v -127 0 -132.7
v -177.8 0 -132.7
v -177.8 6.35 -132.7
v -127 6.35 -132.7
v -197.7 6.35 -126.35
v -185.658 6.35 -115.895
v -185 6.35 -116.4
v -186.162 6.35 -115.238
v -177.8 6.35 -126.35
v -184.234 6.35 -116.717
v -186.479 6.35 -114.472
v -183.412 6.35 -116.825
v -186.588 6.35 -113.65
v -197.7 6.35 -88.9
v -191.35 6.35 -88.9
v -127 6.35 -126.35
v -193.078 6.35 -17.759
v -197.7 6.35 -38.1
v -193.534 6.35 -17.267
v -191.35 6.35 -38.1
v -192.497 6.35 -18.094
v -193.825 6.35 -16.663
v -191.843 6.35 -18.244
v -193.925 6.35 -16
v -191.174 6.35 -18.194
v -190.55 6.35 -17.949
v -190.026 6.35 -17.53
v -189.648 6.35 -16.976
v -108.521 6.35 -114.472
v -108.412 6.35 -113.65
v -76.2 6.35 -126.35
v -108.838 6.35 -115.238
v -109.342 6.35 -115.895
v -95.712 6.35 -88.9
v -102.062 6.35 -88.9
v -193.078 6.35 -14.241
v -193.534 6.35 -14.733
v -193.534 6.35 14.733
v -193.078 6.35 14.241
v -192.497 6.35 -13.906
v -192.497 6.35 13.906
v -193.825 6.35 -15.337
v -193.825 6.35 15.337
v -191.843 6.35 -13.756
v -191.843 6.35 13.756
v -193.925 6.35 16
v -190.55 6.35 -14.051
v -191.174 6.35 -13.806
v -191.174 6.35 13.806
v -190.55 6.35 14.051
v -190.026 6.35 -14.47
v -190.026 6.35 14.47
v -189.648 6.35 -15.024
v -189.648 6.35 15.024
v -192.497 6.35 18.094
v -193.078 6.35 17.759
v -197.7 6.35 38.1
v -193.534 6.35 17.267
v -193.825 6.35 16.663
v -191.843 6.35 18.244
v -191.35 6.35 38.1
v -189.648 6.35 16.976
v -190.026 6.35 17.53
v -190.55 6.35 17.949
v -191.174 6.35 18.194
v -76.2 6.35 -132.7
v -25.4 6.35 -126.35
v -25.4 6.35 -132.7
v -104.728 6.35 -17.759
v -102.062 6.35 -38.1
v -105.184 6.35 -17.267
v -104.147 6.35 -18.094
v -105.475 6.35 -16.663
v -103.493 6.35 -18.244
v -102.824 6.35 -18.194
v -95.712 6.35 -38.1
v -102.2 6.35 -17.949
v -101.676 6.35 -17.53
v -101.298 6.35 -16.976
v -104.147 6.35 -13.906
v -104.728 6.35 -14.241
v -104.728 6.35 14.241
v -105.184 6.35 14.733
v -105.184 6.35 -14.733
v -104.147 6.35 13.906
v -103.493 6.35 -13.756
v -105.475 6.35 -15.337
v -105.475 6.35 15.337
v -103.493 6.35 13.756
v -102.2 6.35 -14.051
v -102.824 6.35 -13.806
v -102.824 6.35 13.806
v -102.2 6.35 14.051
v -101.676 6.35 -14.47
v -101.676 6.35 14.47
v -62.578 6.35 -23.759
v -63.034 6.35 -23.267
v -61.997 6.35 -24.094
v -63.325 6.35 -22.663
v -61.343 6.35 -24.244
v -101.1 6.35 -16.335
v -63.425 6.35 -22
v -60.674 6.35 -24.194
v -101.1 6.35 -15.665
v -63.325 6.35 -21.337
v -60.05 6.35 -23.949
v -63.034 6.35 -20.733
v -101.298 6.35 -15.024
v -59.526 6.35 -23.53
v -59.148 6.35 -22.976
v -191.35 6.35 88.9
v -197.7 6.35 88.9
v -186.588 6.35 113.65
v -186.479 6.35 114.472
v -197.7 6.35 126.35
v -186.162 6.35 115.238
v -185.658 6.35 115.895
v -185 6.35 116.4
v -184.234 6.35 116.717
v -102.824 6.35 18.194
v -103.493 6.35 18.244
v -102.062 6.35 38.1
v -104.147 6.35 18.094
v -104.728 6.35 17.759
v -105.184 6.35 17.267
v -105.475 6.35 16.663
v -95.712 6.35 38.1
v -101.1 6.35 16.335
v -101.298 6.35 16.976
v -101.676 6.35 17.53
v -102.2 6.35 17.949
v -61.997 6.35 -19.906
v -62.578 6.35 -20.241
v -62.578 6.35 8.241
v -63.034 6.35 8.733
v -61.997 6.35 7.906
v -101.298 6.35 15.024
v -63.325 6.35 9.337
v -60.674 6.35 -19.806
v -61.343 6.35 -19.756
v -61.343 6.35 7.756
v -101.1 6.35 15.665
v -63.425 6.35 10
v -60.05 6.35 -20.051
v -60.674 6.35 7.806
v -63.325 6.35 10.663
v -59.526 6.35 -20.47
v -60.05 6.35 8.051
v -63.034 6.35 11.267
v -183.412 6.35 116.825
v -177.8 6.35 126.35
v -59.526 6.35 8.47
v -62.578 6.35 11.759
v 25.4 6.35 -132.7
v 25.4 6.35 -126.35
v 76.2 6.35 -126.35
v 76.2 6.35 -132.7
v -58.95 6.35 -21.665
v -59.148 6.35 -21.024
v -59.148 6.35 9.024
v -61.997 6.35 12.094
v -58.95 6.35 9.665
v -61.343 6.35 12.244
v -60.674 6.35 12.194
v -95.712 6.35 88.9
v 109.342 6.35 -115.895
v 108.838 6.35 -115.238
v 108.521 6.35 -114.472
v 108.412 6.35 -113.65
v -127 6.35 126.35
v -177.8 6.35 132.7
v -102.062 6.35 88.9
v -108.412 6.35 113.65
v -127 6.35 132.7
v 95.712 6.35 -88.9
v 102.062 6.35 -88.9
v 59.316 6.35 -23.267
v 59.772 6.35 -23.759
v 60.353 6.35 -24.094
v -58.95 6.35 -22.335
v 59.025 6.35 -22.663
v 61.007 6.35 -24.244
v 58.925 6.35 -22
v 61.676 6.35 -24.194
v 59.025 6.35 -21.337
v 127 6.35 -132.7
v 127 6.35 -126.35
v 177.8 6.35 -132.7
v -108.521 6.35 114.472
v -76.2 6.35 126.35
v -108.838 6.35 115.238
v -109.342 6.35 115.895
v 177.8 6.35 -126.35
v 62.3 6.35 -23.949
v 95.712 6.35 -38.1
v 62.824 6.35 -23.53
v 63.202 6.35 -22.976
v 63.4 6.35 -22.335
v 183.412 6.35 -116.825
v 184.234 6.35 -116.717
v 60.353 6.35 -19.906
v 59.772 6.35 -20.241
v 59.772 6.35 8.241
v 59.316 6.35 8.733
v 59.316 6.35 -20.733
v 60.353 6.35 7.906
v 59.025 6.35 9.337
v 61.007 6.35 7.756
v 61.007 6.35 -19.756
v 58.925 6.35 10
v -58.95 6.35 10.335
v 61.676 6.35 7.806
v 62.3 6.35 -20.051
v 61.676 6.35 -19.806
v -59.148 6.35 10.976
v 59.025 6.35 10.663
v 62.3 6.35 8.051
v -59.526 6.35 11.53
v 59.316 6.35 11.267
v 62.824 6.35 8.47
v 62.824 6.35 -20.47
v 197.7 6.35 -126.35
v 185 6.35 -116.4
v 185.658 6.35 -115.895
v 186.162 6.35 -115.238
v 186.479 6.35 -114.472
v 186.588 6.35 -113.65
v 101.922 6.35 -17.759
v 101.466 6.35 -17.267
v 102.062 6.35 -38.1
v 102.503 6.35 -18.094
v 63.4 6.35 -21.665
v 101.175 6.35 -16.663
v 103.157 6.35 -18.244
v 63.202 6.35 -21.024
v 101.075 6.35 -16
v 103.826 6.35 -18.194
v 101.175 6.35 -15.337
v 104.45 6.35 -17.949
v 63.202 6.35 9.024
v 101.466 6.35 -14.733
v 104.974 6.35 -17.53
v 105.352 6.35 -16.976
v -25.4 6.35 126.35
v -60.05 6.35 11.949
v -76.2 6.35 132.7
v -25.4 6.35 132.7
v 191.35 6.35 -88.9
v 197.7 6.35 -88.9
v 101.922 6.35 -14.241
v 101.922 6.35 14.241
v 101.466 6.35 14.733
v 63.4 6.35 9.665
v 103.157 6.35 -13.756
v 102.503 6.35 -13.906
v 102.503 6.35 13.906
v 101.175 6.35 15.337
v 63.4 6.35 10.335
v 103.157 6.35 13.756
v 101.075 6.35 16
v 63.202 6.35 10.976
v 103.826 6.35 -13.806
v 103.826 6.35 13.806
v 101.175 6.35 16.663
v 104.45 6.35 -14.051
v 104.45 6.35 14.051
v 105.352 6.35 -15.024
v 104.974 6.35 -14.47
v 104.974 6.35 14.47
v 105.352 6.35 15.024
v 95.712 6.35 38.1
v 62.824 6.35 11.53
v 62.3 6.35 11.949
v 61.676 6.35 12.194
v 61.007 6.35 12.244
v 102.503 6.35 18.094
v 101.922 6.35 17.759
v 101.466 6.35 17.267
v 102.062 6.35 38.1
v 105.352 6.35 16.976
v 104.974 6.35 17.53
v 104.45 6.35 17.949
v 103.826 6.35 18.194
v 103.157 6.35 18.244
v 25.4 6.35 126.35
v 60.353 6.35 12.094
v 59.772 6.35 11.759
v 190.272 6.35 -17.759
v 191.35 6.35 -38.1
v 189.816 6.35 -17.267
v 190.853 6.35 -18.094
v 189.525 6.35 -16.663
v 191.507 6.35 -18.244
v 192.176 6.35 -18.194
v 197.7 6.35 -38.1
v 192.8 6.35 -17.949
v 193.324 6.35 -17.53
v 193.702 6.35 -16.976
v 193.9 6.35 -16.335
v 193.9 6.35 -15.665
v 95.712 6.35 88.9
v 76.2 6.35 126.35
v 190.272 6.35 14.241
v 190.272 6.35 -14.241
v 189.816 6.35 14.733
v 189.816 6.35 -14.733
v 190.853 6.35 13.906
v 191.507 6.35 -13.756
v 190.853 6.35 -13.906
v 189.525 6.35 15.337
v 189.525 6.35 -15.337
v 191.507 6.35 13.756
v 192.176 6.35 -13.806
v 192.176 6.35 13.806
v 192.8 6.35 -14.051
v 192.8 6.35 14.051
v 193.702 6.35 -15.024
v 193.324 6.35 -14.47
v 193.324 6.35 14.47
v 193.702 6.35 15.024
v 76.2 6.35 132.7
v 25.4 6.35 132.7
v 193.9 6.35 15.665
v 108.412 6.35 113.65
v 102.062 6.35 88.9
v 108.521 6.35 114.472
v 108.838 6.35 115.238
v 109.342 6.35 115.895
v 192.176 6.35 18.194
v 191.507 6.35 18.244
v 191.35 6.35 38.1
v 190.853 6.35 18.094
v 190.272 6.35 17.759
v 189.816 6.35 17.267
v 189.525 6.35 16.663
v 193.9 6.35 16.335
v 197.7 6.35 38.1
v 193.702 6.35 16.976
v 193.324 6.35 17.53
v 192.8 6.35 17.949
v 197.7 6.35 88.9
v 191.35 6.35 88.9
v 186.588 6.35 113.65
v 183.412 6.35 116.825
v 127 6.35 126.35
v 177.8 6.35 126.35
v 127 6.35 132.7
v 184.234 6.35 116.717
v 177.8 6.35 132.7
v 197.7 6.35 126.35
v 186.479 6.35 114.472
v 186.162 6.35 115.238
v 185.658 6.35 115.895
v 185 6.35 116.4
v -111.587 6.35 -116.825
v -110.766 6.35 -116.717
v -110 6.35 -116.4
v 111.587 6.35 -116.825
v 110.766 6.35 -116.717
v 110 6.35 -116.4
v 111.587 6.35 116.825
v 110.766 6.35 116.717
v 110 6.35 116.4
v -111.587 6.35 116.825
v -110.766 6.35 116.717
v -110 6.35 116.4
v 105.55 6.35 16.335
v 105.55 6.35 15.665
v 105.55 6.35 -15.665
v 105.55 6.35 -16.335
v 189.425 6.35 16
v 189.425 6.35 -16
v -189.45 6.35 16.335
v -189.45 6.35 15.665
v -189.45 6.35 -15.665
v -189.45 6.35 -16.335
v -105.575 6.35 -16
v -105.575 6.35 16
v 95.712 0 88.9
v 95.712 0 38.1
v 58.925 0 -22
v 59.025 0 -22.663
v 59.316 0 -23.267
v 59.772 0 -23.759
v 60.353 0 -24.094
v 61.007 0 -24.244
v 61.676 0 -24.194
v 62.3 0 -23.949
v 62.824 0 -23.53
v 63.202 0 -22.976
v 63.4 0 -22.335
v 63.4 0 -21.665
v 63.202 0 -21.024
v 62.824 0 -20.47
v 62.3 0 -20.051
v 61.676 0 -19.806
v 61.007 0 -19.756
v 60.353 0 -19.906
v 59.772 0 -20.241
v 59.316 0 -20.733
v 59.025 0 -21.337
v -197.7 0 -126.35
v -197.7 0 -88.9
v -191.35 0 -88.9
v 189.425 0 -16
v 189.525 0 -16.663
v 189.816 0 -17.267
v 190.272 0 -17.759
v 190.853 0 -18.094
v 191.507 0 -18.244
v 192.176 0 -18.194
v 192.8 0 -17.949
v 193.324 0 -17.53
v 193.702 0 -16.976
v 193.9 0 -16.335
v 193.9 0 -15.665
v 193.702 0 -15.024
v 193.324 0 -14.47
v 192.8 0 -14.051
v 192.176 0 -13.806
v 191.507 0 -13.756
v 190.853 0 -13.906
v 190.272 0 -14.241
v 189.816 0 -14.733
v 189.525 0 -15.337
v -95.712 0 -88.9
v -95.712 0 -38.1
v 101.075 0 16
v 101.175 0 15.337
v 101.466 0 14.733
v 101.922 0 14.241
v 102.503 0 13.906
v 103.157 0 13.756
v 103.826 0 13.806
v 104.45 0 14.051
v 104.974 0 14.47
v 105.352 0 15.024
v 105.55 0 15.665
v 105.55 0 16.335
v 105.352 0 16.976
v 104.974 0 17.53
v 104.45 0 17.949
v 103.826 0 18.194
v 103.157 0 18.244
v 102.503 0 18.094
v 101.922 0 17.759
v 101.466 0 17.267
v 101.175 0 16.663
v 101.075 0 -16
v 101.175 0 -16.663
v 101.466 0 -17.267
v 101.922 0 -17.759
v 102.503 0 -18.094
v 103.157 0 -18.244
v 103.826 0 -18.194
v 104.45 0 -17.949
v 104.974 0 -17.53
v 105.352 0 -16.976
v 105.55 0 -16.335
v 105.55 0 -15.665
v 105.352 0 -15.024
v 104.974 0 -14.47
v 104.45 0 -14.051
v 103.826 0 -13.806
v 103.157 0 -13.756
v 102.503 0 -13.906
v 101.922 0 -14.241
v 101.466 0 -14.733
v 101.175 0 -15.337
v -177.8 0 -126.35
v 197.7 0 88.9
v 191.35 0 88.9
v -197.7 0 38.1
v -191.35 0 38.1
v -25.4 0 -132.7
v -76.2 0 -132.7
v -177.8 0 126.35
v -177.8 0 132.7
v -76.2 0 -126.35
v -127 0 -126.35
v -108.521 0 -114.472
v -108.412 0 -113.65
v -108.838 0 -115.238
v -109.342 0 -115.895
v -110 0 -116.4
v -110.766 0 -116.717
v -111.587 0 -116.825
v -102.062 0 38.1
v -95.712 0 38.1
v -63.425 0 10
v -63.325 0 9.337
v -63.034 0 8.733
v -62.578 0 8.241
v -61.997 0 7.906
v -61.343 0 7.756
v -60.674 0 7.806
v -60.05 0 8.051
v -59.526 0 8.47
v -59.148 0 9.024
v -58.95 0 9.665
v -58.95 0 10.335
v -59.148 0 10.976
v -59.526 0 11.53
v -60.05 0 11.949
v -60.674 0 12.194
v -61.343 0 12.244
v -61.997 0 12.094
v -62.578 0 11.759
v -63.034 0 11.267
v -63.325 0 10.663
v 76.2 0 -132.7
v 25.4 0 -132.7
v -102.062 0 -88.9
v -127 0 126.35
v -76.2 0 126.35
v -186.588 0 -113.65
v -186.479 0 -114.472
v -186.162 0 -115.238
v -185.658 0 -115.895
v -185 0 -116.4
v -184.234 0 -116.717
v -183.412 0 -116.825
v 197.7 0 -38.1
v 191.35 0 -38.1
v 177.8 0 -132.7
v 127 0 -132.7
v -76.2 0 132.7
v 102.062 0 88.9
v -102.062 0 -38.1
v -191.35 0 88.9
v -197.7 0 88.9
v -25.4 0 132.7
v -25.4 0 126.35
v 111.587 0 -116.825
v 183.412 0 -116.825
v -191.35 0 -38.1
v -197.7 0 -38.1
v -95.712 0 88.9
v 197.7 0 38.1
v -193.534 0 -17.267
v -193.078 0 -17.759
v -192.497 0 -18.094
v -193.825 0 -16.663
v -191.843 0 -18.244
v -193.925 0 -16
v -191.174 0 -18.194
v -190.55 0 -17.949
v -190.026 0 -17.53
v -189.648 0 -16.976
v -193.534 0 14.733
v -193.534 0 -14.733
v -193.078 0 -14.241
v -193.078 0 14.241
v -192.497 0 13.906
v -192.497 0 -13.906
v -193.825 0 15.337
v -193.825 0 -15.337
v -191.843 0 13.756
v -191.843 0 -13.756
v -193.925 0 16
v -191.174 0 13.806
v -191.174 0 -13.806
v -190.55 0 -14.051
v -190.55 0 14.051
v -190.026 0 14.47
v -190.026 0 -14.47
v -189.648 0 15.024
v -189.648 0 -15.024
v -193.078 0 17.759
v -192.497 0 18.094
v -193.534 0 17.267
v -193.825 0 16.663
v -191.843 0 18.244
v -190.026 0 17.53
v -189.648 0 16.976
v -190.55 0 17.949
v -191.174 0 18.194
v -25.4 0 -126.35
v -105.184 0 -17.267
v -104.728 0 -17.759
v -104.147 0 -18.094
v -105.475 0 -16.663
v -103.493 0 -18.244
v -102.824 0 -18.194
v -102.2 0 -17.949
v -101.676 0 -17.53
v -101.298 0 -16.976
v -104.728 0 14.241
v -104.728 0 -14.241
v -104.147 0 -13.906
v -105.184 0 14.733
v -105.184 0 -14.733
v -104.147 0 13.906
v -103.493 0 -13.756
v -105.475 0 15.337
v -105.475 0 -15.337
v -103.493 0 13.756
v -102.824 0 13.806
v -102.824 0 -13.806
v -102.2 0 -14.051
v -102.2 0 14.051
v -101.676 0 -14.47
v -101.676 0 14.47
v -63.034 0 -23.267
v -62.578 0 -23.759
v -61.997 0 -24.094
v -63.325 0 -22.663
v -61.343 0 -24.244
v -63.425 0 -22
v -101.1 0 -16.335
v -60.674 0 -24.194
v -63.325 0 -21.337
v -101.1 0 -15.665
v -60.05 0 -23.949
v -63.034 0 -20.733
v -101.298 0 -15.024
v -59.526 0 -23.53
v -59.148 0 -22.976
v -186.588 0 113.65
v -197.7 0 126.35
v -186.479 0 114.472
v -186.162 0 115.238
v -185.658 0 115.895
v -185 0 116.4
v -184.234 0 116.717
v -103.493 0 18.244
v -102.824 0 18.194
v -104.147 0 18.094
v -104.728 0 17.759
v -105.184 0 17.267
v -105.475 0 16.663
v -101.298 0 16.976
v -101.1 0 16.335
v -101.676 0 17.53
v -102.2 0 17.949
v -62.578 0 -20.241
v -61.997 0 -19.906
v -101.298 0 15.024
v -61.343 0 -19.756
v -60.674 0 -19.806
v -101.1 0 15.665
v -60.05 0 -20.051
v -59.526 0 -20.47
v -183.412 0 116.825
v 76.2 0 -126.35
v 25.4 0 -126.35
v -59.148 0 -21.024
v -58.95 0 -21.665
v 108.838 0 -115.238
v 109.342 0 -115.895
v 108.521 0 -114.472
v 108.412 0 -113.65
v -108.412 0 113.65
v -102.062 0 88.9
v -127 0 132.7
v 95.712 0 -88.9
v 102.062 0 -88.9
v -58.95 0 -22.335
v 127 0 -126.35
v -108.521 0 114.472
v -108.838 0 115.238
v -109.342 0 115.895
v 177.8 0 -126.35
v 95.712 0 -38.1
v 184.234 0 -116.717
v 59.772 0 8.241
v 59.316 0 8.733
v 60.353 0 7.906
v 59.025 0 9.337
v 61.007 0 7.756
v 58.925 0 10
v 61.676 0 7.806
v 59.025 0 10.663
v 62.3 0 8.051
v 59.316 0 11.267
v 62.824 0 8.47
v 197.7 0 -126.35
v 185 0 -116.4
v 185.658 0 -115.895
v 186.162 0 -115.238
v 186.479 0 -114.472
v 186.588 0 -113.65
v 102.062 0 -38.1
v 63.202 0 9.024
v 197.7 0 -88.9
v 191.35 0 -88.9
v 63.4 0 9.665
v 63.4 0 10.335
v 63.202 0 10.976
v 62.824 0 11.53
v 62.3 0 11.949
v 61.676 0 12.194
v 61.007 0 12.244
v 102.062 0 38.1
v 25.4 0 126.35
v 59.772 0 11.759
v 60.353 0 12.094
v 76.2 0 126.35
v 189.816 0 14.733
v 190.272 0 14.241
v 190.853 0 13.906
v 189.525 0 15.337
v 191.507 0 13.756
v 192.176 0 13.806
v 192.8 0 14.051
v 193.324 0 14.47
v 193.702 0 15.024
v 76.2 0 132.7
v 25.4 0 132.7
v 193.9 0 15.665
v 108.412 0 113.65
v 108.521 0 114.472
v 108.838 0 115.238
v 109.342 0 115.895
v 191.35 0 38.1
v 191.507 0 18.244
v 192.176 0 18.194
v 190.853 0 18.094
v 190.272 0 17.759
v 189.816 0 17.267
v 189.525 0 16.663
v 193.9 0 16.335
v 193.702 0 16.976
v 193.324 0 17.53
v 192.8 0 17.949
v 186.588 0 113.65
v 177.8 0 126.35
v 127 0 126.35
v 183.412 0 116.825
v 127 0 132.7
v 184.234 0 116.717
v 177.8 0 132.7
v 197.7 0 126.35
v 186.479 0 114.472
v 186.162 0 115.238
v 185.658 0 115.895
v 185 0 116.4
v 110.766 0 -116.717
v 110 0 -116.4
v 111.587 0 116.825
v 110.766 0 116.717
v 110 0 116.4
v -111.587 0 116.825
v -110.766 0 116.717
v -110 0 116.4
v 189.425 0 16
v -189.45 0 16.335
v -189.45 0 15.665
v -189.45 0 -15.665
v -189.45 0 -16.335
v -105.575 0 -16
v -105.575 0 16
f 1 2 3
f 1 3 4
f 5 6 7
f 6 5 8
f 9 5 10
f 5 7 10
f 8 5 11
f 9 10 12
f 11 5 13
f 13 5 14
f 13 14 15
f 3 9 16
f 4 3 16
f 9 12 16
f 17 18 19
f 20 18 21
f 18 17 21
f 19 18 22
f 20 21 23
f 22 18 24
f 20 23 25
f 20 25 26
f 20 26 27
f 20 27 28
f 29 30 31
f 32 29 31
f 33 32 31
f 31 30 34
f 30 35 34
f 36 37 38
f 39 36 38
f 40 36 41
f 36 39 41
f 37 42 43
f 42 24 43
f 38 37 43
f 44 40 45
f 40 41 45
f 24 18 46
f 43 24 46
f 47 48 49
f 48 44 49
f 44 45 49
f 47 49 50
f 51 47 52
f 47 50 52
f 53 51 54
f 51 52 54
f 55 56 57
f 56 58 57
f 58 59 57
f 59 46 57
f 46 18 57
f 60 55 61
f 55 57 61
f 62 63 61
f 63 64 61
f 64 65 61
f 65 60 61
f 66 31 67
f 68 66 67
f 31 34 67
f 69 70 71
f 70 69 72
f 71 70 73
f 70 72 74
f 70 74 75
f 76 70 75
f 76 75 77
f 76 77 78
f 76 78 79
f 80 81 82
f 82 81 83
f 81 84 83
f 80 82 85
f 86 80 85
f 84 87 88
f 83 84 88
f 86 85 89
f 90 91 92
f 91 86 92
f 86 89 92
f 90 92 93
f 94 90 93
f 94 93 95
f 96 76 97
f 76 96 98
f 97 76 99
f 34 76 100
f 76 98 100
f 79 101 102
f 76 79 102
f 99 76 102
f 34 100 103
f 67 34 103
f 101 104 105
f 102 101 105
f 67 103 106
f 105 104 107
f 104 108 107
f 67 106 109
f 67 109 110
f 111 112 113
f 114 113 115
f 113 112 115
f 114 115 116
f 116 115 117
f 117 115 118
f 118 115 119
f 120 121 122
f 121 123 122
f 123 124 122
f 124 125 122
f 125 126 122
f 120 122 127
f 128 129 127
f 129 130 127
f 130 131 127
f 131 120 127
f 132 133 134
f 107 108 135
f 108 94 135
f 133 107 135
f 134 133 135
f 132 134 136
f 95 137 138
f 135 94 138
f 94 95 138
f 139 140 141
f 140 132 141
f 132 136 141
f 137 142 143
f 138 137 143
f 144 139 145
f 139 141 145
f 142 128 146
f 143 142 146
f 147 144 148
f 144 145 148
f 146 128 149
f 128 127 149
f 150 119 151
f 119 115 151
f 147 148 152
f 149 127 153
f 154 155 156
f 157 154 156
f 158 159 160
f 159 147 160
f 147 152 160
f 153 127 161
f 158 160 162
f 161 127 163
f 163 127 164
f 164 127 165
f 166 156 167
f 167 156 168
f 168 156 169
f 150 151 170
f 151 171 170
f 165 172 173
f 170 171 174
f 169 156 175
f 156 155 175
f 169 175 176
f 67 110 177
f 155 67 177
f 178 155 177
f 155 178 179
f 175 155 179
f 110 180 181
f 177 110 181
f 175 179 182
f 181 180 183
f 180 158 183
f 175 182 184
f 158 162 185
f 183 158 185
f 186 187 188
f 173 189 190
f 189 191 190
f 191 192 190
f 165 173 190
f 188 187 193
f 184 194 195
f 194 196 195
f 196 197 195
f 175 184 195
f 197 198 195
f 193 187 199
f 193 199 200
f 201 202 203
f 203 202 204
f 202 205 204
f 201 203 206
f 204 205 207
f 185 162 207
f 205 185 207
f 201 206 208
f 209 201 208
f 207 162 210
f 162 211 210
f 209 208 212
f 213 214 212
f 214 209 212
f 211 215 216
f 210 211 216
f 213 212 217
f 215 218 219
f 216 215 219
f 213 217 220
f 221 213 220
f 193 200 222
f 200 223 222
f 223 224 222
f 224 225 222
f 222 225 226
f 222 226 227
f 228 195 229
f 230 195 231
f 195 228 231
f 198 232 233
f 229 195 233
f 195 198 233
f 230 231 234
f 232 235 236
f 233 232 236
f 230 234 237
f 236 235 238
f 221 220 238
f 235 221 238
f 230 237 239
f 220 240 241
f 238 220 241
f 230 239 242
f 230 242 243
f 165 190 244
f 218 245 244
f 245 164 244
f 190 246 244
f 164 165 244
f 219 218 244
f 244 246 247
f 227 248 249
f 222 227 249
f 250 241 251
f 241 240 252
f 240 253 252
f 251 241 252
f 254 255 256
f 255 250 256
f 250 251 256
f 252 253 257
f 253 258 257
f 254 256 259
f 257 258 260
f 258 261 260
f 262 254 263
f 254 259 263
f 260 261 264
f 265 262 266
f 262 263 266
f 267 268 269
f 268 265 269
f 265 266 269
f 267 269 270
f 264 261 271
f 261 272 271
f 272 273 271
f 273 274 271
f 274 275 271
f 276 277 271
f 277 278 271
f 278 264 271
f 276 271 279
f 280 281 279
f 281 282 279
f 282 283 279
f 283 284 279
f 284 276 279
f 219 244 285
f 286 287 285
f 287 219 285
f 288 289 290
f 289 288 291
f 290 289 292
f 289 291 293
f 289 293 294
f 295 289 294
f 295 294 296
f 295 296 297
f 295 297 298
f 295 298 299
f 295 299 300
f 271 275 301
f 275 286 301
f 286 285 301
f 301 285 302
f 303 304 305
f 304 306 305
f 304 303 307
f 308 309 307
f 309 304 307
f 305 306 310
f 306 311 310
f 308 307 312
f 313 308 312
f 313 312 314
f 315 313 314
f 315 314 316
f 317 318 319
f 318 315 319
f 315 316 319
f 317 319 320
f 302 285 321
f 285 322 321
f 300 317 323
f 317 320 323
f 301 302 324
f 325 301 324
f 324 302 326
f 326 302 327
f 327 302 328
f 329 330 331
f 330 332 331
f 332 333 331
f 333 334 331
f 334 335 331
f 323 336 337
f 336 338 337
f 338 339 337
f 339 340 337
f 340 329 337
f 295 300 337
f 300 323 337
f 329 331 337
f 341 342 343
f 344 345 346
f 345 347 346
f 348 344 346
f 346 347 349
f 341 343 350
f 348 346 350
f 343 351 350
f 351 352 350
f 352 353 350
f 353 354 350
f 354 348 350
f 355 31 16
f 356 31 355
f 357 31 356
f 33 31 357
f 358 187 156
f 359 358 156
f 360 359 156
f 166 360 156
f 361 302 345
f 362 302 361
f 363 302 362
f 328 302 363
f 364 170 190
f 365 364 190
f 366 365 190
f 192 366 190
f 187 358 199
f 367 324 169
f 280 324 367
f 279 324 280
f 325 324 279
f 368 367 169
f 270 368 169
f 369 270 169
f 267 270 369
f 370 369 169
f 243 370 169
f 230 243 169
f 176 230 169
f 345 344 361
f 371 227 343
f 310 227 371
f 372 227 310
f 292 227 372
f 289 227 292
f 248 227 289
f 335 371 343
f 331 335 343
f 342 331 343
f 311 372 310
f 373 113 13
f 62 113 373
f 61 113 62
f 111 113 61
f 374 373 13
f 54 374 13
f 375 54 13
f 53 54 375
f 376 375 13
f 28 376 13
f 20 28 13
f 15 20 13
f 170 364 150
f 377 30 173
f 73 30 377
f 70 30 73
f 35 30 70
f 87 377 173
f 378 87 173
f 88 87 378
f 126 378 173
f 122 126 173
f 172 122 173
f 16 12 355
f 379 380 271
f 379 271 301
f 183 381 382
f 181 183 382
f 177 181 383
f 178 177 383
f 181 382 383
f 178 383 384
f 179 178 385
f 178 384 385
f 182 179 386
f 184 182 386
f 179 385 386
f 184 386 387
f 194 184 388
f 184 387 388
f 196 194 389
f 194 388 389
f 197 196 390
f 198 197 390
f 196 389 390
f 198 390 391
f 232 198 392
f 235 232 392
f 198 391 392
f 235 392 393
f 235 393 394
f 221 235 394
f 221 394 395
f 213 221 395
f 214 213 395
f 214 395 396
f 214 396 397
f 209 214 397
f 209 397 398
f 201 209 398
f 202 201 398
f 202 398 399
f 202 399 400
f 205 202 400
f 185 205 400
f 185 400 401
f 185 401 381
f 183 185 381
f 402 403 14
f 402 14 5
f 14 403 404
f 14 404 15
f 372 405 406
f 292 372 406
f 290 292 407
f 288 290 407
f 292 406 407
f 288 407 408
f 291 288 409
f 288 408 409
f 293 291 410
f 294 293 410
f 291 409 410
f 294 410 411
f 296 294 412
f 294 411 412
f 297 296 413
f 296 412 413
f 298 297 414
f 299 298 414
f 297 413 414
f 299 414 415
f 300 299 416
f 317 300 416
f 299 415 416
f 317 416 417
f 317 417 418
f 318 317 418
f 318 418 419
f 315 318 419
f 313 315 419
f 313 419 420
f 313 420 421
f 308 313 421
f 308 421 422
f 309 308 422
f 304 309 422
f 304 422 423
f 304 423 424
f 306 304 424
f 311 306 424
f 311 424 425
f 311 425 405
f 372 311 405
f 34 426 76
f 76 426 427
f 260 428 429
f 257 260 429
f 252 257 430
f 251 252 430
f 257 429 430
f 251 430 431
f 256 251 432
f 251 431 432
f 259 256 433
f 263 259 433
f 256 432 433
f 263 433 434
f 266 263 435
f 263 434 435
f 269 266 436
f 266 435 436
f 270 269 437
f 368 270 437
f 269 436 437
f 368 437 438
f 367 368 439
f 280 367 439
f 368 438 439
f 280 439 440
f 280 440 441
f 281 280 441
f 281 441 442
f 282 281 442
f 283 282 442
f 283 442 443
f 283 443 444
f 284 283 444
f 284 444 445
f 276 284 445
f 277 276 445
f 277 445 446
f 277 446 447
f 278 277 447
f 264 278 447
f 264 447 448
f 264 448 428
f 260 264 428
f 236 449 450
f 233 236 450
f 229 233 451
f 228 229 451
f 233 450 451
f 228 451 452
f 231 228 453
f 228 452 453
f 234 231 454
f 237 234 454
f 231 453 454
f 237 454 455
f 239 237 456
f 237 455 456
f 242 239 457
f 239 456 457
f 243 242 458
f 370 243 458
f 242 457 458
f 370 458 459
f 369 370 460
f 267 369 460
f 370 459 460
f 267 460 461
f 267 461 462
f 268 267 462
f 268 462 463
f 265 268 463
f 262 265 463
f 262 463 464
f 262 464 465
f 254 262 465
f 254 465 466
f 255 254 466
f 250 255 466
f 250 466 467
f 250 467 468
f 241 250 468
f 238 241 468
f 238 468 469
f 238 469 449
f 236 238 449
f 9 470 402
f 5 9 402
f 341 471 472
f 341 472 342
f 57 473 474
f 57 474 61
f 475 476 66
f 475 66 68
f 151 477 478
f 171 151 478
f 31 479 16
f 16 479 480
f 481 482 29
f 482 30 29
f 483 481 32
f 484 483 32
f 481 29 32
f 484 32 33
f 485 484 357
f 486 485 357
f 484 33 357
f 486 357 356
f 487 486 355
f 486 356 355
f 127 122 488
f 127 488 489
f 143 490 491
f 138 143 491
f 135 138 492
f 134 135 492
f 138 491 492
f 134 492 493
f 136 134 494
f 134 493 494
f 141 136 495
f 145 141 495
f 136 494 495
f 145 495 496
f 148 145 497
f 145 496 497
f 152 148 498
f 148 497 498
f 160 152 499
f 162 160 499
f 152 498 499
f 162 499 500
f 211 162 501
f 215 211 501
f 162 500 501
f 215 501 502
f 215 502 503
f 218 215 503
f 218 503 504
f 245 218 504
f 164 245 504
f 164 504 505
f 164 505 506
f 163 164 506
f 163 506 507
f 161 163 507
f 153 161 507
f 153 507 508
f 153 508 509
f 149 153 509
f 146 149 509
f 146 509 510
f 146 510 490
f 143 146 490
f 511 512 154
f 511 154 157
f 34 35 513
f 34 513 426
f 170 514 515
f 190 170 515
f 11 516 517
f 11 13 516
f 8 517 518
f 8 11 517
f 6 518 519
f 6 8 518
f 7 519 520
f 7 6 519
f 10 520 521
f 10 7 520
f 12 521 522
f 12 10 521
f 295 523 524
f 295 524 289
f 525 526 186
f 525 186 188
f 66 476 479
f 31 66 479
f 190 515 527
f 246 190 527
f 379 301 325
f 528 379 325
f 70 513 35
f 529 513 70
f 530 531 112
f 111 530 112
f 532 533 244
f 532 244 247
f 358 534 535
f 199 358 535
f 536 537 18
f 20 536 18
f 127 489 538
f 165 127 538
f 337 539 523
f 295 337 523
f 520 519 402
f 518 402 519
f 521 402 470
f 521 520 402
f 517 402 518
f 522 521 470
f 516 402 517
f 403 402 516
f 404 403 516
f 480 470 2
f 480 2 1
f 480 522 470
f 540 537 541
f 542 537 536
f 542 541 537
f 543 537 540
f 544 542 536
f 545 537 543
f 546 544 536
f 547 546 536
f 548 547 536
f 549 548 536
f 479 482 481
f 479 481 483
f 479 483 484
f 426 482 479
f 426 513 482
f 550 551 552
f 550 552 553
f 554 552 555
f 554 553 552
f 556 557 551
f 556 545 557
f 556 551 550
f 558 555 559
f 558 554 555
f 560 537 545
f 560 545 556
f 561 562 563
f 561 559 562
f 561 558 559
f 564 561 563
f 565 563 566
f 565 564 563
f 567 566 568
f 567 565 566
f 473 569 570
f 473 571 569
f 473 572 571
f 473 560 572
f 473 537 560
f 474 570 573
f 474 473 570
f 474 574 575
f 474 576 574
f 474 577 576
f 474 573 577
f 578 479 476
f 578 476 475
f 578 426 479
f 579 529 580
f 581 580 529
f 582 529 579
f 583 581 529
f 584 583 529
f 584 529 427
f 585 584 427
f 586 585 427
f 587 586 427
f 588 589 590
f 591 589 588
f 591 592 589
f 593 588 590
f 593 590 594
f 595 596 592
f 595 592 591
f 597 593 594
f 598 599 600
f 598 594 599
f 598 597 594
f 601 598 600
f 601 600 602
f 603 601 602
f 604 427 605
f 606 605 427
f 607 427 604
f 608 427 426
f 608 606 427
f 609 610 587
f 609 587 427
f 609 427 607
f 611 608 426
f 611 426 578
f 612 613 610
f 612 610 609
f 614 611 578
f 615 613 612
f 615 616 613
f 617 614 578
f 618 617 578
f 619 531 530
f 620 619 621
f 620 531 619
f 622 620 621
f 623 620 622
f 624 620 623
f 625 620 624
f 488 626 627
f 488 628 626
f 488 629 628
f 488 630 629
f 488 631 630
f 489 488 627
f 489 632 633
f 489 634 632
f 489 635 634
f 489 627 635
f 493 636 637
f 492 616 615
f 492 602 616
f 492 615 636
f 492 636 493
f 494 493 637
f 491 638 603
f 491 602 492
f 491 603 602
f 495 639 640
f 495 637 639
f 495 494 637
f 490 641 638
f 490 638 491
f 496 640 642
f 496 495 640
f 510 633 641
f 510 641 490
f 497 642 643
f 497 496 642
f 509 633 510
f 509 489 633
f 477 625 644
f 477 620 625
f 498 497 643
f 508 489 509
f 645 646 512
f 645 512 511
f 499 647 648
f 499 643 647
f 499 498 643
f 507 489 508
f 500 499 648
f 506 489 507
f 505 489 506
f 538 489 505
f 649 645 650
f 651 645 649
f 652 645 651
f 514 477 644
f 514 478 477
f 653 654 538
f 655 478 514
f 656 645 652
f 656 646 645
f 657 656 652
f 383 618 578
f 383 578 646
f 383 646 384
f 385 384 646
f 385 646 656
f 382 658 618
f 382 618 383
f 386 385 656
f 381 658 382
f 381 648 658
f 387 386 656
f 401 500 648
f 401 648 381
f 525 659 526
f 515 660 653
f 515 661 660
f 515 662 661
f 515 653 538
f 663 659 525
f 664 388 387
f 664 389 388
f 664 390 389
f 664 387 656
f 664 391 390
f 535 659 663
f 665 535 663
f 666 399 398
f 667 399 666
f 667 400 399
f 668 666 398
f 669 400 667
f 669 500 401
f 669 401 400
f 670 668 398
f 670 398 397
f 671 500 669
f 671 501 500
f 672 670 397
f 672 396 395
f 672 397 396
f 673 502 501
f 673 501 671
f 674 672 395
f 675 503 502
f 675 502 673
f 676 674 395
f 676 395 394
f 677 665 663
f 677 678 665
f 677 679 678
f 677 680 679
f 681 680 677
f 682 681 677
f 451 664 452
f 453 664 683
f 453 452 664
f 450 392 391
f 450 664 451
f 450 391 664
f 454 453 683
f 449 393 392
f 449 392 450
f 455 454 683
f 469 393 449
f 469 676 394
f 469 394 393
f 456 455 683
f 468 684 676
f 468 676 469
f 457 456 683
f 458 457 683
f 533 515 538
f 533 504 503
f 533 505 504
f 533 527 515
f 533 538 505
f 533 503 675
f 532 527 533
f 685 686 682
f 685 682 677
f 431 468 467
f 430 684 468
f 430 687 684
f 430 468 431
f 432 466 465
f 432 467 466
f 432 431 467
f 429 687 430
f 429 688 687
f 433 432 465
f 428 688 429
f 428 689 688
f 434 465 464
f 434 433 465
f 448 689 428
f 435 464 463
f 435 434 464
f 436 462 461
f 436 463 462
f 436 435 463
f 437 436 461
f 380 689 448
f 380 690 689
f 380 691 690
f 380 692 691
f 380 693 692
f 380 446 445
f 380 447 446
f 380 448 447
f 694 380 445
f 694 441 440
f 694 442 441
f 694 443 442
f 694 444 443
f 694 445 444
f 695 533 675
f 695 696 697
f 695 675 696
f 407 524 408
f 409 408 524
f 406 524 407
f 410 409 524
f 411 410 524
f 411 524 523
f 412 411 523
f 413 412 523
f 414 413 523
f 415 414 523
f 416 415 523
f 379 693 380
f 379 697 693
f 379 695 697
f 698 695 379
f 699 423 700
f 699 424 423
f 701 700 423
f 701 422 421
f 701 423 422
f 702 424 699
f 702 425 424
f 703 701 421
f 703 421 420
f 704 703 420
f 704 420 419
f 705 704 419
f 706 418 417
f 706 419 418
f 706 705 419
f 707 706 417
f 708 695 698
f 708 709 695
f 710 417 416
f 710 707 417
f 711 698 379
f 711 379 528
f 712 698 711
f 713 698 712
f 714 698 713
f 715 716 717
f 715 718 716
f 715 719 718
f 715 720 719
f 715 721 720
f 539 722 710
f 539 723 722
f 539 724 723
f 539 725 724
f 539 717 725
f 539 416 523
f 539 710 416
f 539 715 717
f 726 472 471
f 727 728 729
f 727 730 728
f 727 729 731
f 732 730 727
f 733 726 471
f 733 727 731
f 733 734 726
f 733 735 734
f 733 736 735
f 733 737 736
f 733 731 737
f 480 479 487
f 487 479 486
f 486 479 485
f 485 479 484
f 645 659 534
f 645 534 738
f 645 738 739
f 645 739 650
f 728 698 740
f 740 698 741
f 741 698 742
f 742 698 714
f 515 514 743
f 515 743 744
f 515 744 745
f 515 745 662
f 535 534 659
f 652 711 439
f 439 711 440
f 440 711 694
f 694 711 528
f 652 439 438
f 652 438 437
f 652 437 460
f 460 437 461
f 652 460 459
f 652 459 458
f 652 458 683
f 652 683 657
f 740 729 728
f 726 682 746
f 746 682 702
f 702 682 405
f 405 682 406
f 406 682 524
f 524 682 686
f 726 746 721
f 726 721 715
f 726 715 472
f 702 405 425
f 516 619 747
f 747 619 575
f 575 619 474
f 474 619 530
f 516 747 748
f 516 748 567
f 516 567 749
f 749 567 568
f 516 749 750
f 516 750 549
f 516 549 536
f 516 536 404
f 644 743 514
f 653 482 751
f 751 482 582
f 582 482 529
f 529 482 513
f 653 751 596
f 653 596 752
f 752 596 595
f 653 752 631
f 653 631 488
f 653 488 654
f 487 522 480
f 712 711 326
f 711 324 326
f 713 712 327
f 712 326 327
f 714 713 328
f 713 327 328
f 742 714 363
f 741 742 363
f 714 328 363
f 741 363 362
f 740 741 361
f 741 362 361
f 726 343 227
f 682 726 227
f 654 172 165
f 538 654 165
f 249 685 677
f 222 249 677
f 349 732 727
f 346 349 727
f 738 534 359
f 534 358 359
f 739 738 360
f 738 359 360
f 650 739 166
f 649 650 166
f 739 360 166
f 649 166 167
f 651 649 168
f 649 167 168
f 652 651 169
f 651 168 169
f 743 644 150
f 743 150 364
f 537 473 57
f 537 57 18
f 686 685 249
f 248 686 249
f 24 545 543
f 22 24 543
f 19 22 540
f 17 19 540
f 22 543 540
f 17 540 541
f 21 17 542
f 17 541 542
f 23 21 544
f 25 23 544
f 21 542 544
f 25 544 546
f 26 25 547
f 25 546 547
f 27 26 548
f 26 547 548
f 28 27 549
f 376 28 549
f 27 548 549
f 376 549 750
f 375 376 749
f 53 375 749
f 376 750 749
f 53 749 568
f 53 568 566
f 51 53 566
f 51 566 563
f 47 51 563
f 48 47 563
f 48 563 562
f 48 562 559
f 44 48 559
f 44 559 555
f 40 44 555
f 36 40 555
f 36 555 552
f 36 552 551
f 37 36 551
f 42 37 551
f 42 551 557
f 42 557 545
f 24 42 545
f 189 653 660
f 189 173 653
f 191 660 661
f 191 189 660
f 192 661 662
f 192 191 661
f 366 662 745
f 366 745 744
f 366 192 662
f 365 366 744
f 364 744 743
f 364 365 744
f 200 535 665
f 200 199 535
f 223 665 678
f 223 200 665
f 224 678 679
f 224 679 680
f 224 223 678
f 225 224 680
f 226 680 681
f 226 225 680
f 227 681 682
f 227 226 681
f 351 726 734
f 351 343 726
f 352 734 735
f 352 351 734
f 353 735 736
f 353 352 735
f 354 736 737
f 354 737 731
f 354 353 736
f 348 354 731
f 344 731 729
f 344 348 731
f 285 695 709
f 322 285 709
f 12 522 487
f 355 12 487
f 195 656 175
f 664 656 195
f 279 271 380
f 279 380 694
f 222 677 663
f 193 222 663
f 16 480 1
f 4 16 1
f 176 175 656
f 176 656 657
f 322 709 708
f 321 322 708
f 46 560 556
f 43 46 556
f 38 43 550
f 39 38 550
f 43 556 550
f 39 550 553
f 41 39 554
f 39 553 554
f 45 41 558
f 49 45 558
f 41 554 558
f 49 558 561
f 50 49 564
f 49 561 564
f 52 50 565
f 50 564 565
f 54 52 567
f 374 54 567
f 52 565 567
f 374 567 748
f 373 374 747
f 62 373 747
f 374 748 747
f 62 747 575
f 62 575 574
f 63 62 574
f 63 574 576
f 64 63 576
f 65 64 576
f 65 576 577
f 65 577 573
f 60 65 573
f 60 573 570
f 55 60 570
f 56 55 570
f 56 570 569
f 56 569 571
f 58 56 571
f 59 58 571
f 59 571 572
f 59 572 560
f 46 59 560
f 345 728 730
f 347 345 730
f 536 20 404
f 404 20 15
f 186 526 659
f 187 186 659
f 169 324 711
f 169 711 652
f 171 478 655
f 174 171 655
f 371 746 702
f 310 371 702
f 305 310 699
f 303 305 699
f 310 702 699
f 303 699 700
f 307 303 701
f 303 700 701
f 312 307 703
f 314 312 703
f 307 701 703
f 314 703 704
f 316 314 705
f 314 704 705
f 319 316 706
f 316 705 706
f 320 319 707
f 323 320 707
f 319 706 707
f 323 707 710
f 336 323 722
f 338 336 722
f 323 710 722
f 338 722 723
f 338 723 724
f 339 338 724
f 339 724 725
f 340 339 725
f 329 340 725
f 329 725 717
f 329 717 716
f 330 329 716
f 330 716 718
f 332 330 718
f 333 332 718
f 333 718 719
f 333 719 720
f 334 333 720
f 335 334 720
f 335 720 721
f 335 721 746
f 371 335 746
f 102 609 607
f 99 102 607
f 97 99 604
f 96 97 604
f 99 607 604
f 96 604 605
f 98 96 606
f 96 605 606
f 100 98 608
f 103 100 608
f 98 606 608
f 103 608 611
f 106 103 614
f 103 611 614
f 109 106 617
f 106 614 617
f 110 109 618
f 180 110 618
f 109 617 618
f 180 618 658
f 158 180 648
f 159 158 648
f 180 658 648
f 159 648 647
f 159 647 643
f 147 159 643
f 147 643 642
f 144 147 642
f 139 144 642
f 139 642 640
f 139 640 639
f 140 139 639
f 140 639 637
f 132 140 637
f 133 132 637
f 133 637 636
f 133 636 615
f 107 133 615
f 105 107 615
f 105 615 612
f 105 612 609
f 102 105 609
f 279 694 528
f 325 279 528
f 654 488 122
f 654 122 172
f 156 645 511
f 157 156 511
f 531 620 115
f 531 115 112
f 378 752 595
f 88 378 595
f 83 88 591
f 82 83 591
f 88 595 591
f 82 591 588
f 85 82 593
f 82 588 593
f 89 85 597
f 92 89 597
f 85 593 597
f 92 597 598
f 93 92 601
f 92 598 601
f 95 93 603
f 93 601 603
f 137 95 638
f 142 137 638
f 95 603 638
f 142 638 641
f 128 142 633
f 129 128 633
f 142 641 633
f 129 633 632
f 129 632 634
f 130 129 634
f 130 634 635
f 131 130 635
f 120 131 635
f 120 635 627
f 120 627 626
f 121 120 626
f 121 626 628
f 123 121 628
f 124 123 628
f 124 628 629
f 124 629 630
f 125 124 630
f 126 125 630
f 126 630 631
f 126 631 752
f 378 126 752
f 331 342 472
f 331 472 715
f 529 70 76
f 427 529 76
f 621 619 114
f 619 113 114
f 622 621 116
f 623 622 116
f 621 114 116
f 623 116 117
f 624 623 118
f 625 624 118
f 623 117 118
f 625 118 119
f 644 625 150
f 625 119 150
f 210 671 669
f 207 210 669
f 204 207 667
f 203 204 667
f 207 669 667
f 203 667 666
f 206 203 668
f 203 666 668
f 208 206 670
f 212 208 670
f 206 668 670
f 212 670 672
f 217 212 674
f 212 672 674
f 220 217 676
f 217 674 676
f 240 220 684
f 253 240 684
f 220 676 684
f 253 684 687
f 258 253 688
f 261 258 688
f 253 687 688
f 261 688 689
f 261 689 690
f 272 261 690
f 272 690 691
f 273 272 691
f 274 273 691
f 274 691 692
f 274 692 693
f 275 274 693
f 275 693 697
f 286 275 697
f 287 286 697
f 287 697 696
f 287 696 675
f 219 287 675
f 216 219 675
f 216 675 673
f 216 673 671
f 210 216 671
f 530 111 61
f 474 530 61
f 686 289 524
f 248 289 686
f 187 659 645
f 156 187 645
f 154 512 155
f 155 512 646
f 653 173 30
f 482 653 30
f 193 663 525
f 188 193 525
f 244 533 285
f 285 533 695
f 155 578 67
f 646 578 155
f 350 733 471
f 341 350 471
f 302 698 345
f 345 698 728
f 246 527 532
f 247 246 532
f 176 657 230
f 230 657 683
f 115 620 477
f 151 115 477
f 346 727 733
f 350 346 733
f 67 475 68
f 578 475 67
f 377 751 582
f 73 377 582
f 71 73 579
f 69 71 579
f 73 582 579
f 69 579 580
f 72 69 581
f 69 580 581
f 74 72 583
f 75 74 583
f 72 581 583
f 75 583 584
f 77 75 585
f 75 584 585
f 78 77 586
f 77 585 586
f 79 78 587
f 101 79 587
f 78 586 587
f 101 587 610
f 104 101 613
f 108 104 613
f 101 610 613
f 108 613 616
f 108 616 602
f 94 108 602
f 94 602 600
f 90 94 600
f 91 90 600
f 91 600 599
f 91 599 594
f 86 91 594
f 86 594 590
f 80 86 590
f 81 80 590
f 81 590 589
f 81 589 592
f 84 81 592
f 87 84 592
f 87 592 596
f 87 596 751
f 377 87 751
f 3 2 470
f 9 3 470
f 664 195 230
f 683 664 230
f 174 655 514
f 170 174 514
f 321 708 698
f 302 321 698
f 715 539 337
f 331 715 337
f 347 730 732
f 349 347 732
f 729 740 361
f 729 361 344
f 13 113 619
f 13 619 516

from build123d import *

# Parameters (mm, degrees)
SKETCH5_W             = 395.4
SKETCH5_H             = 265.4
BOSS_EXTRUDE3_DEPTH   = 6.35
SKETCH6_W             = 78.175
SKETCH6_H             = 243.175
SKETCH6_W_2           = 75
SKETCH6_H_2           = 240
CUT_EXTRUDE1_DEPTH    = 6.35
F_4_0MM_DOWEL_HOLE1_D = 4.5
SKETCH10_W            = 6.35
SKETCH10_H            = 50.8
SKETCH10_W_2          = 50.8
SKETCH10_H_2          = 6.35
CUT_EXTRUDE2_DEPTH    = 6.35
SKETCH11_W            = 50.8
SKETCH11_H            = 6.35
CUT_EXTRUDE3_DEPTH    = 6.35
SKETCH12_W            = 78.175
SKETCH12_H            = 4.7625
BOSS_EXTRUDE4_DEPTH   = 6.35
FILLET1_R             = 3.175


with BuildPart() as part:
    # Sketch5 → Boss-Extrude3 (new body)
    with BuildSketch(Plane(origin=(0, 0, 0), x_dir=(1, 0, 0), z_dir=(0, 1, 0))):
        Rectangle(SKETCH5_W, SKETCH5_H)
    extrude(amount=BOSS_EXTRUDE3_DEPTH)

    # Sketch6 → Cut-Extrude1 (cut)
    # profile 1 of 4: a face of its own
    with BuildSketch(Plane(origin=(0, 6.35, 0), x_dir=(1, 0, 0), z_dir=(0, 1, 0))):
        with Locations((147.5, 0)):
            Rectangle(SKETCH6_W, SKETCH6_H)
        with Locations((147.5, 0)):
            Rectangle(SKETCH6_W_2, SKETCH6_H_2, mode=Mode.SUBTRACT)
    # profile 2 of 4: a face of its own
    with BuildSketch(Plane(origin=(0, 6.35, 0), x_dir=(1, 0, 0), z_dir=(0, 1, 0))):
        with Locations((147.5, 0)):
            Rectangle(SKETCH6_W_2, SKETCH6_H_2)
    # profile 3 of 4: a face of its own
    with BuildSketch(Plane(origin=(0, 6.35, 0), x_dir=(1, 0, 0), z_dir=(0, 1, 0))):
        with Locations((-147.5, 0)):
            Rectangle(SKETCH6_W, SKETCH6_H)
        with Locations((-147.5, 0)):
            Rectangle(SKETCH6_W_2, SKETCH6_H_2, mode=Mode.SUBTRACT)
    # profile 4 of 4: a face of its own
    with BuildSketch(Plane(origin=(0, 6.35, 0), x_dir=(1, 0, 0), z_dir=(0, 1, 0))):
        with Locations((-147.5, 0)):
            Rectangle(SKETCH6_W_2, SKETCH6_H_2)
    extrude(amount=-CUT_EXTRUDE1_DEPTH, mode=Mode.SUBTRACT)

    # Ø4.0mm Dowel Hole1 (through all)
    with Locations(Plane(origin=(0, 6.35, 0), x_dir=(1, 0, 0), z_dir=(0, 1, 0))):
        with Locations((191.675, -16), (191.675, 16), (103.325, -16), (103.325, 16), (-191.675, -16), (-191.675, 16), (-103.325, -16), (-103.325, 16), (-61.175, -10), (-61.175, 22), (61.175, 22), (61.175, -10)):
            Hole(F_4_0MM_DOWEL_HOLE1_D / 2)

    # Sketch10 → Cut-Extrude2 (cut)
    with BuildSketch(Plane.XZ):
        with Locations((98.8875, -63.5)):
            Rectangle(SKETCH10_W, SKETCH10_H)
        with Locations((98.8875, 63.5)):
            Rectangle(SKETCH10_W, SKETCH10_H)
        with Locations((-98.8875, 63.5)):
            Rectangle(SKETCH10_W, SKETCH10_H)
        with Locations((-98.8875, -63.5)):
            Rectangle(SKETCH10_W, SKETCH10_H)
        Polygon((197.7, 132.7), (177.8, 132.7), (177.8, 126.35), (191.35, 126.35), (197.7, 126.35), align=None)
        Polygon((127, 132.7), (76.2, 132.7), (76.2, 126.35), (95.7125, 126.35), (102.0625, 126.35), (108.4125, 126.35), (127, 126.35), align=None)
        with Locations((0, 129.525)):
            Rectangle(SKETCH10_W_2, SKETCH10_H_2)
        Polygon((-127, 132.7), (-127, 126.35), (-108.4125, 126.35), (-102.0625, 126.35), (-95.7125, 126.35), (-76.2, 126.35), (-76.2, 132.7), align=None)
        Polygon((-197.7, 126.35), (-191.35, 126.35), (-177.8, 126.35), (-177.8, 132.7), (-197.7, 132.7), align=None)
        Polygon((-177.8, -126.35), (-191.35, -126.35), (-197.7, -126.35), (-197.7, -132.7), (-177.8, -132.7), align=None)
        Polygon((-108.4125, -126.35), (-127, -126.35), (-127, -132.7), (-76.2, -132.7), (-76.2, -126.35), (-95.7125, -126.35), (-102.0625, -126.35), align=None)
        with Locations((0, -129.525)):
            Rectangle(SKETCH10_W_2, SKETCH10_H_2)
        Polygon((76.2, -126.35), (76.2, -132.7), (127, -132.7), (127, -126.35), (108.4125, -126.35), (102.0625, -126.35), (95.7125, -126.35), align=None)
        Polygon((177.8, -126.35), (177.8, -132.7), (197.7, -132.7), (197.7, -126.35), (191.35, -126.35), align=None)
    extrude(amount=-CUT_EXTRUDE2_DEPTH, mode=Mode.SUBTRACT)

    # Sketch11 → Cut-Extrude3 (cut)
    with BuildSketch(Plane(origin=(197.7, 0, 0), x_dir=(0, 0, -1), z_dir=(1, 0, 0))):
        with Locations((-63.5, 3.175)):
            Rectangle(SKETCH11_W, SKETCH11_H)
        with Locations((63.5, 3.175)):
            Rectangle(SKETCH11_W, SKETCH11_H)
    cut_extrude3 = extrude(amount=-CUT_EXTRUDE3_DEPTH, mode=Mode.SUBTRACT)

    # Mirror1: Cut-Extrude3 across plane
    add(cut_extrude3.mirror(Plane(origin=(0, 0, 0), x_dir=(0, 0, 1), z_dir=(1, 0, 0))), mode=Mode.SUBTRACT)

    # Sketch12 → Boss-Extrude4 (add)
    with BuildSketch(Plane.XZ):
        with Locations((147.5, -119.20625)):
            Rectangle(SKETCH12_W, SKETCH12_H)
        with Locations((147.5, 119.20625)):
            Rectangle(SKETCH12_W, SKETCH12_H)
        with Locations((-147.5, 119.20625)):
            Rectangle(SKETCH12_W, SKETCH12_H)
        with Locations((-147.5, -119.20625)):
            Rectangle(SKETCH12_W, SKETCH12_H)
    extrude(amount=-BOSS_EXTRUDE4_DEPTH)

    # Fillet1
    fillet1_edges = [part.edges().sort_by_distance(p)[0] for p in [
        (108.4125, 3.175, -116.825),
        (186.5875, 3.175, -116.825),
        (186.5875, 3.175, 116.825),
        (108.4125, 3.175, 116.825),
        (-186.5875, 3.175, 116.825),
        (-108.4125, 3.175, 116.825),
        (-108.4125, 3.175, -116.825),
        (-186.5875, 3.175, -116.825),
    ]]
    fillet(fillet1_edges, radius=FILLET1_R)


solid = part.part
